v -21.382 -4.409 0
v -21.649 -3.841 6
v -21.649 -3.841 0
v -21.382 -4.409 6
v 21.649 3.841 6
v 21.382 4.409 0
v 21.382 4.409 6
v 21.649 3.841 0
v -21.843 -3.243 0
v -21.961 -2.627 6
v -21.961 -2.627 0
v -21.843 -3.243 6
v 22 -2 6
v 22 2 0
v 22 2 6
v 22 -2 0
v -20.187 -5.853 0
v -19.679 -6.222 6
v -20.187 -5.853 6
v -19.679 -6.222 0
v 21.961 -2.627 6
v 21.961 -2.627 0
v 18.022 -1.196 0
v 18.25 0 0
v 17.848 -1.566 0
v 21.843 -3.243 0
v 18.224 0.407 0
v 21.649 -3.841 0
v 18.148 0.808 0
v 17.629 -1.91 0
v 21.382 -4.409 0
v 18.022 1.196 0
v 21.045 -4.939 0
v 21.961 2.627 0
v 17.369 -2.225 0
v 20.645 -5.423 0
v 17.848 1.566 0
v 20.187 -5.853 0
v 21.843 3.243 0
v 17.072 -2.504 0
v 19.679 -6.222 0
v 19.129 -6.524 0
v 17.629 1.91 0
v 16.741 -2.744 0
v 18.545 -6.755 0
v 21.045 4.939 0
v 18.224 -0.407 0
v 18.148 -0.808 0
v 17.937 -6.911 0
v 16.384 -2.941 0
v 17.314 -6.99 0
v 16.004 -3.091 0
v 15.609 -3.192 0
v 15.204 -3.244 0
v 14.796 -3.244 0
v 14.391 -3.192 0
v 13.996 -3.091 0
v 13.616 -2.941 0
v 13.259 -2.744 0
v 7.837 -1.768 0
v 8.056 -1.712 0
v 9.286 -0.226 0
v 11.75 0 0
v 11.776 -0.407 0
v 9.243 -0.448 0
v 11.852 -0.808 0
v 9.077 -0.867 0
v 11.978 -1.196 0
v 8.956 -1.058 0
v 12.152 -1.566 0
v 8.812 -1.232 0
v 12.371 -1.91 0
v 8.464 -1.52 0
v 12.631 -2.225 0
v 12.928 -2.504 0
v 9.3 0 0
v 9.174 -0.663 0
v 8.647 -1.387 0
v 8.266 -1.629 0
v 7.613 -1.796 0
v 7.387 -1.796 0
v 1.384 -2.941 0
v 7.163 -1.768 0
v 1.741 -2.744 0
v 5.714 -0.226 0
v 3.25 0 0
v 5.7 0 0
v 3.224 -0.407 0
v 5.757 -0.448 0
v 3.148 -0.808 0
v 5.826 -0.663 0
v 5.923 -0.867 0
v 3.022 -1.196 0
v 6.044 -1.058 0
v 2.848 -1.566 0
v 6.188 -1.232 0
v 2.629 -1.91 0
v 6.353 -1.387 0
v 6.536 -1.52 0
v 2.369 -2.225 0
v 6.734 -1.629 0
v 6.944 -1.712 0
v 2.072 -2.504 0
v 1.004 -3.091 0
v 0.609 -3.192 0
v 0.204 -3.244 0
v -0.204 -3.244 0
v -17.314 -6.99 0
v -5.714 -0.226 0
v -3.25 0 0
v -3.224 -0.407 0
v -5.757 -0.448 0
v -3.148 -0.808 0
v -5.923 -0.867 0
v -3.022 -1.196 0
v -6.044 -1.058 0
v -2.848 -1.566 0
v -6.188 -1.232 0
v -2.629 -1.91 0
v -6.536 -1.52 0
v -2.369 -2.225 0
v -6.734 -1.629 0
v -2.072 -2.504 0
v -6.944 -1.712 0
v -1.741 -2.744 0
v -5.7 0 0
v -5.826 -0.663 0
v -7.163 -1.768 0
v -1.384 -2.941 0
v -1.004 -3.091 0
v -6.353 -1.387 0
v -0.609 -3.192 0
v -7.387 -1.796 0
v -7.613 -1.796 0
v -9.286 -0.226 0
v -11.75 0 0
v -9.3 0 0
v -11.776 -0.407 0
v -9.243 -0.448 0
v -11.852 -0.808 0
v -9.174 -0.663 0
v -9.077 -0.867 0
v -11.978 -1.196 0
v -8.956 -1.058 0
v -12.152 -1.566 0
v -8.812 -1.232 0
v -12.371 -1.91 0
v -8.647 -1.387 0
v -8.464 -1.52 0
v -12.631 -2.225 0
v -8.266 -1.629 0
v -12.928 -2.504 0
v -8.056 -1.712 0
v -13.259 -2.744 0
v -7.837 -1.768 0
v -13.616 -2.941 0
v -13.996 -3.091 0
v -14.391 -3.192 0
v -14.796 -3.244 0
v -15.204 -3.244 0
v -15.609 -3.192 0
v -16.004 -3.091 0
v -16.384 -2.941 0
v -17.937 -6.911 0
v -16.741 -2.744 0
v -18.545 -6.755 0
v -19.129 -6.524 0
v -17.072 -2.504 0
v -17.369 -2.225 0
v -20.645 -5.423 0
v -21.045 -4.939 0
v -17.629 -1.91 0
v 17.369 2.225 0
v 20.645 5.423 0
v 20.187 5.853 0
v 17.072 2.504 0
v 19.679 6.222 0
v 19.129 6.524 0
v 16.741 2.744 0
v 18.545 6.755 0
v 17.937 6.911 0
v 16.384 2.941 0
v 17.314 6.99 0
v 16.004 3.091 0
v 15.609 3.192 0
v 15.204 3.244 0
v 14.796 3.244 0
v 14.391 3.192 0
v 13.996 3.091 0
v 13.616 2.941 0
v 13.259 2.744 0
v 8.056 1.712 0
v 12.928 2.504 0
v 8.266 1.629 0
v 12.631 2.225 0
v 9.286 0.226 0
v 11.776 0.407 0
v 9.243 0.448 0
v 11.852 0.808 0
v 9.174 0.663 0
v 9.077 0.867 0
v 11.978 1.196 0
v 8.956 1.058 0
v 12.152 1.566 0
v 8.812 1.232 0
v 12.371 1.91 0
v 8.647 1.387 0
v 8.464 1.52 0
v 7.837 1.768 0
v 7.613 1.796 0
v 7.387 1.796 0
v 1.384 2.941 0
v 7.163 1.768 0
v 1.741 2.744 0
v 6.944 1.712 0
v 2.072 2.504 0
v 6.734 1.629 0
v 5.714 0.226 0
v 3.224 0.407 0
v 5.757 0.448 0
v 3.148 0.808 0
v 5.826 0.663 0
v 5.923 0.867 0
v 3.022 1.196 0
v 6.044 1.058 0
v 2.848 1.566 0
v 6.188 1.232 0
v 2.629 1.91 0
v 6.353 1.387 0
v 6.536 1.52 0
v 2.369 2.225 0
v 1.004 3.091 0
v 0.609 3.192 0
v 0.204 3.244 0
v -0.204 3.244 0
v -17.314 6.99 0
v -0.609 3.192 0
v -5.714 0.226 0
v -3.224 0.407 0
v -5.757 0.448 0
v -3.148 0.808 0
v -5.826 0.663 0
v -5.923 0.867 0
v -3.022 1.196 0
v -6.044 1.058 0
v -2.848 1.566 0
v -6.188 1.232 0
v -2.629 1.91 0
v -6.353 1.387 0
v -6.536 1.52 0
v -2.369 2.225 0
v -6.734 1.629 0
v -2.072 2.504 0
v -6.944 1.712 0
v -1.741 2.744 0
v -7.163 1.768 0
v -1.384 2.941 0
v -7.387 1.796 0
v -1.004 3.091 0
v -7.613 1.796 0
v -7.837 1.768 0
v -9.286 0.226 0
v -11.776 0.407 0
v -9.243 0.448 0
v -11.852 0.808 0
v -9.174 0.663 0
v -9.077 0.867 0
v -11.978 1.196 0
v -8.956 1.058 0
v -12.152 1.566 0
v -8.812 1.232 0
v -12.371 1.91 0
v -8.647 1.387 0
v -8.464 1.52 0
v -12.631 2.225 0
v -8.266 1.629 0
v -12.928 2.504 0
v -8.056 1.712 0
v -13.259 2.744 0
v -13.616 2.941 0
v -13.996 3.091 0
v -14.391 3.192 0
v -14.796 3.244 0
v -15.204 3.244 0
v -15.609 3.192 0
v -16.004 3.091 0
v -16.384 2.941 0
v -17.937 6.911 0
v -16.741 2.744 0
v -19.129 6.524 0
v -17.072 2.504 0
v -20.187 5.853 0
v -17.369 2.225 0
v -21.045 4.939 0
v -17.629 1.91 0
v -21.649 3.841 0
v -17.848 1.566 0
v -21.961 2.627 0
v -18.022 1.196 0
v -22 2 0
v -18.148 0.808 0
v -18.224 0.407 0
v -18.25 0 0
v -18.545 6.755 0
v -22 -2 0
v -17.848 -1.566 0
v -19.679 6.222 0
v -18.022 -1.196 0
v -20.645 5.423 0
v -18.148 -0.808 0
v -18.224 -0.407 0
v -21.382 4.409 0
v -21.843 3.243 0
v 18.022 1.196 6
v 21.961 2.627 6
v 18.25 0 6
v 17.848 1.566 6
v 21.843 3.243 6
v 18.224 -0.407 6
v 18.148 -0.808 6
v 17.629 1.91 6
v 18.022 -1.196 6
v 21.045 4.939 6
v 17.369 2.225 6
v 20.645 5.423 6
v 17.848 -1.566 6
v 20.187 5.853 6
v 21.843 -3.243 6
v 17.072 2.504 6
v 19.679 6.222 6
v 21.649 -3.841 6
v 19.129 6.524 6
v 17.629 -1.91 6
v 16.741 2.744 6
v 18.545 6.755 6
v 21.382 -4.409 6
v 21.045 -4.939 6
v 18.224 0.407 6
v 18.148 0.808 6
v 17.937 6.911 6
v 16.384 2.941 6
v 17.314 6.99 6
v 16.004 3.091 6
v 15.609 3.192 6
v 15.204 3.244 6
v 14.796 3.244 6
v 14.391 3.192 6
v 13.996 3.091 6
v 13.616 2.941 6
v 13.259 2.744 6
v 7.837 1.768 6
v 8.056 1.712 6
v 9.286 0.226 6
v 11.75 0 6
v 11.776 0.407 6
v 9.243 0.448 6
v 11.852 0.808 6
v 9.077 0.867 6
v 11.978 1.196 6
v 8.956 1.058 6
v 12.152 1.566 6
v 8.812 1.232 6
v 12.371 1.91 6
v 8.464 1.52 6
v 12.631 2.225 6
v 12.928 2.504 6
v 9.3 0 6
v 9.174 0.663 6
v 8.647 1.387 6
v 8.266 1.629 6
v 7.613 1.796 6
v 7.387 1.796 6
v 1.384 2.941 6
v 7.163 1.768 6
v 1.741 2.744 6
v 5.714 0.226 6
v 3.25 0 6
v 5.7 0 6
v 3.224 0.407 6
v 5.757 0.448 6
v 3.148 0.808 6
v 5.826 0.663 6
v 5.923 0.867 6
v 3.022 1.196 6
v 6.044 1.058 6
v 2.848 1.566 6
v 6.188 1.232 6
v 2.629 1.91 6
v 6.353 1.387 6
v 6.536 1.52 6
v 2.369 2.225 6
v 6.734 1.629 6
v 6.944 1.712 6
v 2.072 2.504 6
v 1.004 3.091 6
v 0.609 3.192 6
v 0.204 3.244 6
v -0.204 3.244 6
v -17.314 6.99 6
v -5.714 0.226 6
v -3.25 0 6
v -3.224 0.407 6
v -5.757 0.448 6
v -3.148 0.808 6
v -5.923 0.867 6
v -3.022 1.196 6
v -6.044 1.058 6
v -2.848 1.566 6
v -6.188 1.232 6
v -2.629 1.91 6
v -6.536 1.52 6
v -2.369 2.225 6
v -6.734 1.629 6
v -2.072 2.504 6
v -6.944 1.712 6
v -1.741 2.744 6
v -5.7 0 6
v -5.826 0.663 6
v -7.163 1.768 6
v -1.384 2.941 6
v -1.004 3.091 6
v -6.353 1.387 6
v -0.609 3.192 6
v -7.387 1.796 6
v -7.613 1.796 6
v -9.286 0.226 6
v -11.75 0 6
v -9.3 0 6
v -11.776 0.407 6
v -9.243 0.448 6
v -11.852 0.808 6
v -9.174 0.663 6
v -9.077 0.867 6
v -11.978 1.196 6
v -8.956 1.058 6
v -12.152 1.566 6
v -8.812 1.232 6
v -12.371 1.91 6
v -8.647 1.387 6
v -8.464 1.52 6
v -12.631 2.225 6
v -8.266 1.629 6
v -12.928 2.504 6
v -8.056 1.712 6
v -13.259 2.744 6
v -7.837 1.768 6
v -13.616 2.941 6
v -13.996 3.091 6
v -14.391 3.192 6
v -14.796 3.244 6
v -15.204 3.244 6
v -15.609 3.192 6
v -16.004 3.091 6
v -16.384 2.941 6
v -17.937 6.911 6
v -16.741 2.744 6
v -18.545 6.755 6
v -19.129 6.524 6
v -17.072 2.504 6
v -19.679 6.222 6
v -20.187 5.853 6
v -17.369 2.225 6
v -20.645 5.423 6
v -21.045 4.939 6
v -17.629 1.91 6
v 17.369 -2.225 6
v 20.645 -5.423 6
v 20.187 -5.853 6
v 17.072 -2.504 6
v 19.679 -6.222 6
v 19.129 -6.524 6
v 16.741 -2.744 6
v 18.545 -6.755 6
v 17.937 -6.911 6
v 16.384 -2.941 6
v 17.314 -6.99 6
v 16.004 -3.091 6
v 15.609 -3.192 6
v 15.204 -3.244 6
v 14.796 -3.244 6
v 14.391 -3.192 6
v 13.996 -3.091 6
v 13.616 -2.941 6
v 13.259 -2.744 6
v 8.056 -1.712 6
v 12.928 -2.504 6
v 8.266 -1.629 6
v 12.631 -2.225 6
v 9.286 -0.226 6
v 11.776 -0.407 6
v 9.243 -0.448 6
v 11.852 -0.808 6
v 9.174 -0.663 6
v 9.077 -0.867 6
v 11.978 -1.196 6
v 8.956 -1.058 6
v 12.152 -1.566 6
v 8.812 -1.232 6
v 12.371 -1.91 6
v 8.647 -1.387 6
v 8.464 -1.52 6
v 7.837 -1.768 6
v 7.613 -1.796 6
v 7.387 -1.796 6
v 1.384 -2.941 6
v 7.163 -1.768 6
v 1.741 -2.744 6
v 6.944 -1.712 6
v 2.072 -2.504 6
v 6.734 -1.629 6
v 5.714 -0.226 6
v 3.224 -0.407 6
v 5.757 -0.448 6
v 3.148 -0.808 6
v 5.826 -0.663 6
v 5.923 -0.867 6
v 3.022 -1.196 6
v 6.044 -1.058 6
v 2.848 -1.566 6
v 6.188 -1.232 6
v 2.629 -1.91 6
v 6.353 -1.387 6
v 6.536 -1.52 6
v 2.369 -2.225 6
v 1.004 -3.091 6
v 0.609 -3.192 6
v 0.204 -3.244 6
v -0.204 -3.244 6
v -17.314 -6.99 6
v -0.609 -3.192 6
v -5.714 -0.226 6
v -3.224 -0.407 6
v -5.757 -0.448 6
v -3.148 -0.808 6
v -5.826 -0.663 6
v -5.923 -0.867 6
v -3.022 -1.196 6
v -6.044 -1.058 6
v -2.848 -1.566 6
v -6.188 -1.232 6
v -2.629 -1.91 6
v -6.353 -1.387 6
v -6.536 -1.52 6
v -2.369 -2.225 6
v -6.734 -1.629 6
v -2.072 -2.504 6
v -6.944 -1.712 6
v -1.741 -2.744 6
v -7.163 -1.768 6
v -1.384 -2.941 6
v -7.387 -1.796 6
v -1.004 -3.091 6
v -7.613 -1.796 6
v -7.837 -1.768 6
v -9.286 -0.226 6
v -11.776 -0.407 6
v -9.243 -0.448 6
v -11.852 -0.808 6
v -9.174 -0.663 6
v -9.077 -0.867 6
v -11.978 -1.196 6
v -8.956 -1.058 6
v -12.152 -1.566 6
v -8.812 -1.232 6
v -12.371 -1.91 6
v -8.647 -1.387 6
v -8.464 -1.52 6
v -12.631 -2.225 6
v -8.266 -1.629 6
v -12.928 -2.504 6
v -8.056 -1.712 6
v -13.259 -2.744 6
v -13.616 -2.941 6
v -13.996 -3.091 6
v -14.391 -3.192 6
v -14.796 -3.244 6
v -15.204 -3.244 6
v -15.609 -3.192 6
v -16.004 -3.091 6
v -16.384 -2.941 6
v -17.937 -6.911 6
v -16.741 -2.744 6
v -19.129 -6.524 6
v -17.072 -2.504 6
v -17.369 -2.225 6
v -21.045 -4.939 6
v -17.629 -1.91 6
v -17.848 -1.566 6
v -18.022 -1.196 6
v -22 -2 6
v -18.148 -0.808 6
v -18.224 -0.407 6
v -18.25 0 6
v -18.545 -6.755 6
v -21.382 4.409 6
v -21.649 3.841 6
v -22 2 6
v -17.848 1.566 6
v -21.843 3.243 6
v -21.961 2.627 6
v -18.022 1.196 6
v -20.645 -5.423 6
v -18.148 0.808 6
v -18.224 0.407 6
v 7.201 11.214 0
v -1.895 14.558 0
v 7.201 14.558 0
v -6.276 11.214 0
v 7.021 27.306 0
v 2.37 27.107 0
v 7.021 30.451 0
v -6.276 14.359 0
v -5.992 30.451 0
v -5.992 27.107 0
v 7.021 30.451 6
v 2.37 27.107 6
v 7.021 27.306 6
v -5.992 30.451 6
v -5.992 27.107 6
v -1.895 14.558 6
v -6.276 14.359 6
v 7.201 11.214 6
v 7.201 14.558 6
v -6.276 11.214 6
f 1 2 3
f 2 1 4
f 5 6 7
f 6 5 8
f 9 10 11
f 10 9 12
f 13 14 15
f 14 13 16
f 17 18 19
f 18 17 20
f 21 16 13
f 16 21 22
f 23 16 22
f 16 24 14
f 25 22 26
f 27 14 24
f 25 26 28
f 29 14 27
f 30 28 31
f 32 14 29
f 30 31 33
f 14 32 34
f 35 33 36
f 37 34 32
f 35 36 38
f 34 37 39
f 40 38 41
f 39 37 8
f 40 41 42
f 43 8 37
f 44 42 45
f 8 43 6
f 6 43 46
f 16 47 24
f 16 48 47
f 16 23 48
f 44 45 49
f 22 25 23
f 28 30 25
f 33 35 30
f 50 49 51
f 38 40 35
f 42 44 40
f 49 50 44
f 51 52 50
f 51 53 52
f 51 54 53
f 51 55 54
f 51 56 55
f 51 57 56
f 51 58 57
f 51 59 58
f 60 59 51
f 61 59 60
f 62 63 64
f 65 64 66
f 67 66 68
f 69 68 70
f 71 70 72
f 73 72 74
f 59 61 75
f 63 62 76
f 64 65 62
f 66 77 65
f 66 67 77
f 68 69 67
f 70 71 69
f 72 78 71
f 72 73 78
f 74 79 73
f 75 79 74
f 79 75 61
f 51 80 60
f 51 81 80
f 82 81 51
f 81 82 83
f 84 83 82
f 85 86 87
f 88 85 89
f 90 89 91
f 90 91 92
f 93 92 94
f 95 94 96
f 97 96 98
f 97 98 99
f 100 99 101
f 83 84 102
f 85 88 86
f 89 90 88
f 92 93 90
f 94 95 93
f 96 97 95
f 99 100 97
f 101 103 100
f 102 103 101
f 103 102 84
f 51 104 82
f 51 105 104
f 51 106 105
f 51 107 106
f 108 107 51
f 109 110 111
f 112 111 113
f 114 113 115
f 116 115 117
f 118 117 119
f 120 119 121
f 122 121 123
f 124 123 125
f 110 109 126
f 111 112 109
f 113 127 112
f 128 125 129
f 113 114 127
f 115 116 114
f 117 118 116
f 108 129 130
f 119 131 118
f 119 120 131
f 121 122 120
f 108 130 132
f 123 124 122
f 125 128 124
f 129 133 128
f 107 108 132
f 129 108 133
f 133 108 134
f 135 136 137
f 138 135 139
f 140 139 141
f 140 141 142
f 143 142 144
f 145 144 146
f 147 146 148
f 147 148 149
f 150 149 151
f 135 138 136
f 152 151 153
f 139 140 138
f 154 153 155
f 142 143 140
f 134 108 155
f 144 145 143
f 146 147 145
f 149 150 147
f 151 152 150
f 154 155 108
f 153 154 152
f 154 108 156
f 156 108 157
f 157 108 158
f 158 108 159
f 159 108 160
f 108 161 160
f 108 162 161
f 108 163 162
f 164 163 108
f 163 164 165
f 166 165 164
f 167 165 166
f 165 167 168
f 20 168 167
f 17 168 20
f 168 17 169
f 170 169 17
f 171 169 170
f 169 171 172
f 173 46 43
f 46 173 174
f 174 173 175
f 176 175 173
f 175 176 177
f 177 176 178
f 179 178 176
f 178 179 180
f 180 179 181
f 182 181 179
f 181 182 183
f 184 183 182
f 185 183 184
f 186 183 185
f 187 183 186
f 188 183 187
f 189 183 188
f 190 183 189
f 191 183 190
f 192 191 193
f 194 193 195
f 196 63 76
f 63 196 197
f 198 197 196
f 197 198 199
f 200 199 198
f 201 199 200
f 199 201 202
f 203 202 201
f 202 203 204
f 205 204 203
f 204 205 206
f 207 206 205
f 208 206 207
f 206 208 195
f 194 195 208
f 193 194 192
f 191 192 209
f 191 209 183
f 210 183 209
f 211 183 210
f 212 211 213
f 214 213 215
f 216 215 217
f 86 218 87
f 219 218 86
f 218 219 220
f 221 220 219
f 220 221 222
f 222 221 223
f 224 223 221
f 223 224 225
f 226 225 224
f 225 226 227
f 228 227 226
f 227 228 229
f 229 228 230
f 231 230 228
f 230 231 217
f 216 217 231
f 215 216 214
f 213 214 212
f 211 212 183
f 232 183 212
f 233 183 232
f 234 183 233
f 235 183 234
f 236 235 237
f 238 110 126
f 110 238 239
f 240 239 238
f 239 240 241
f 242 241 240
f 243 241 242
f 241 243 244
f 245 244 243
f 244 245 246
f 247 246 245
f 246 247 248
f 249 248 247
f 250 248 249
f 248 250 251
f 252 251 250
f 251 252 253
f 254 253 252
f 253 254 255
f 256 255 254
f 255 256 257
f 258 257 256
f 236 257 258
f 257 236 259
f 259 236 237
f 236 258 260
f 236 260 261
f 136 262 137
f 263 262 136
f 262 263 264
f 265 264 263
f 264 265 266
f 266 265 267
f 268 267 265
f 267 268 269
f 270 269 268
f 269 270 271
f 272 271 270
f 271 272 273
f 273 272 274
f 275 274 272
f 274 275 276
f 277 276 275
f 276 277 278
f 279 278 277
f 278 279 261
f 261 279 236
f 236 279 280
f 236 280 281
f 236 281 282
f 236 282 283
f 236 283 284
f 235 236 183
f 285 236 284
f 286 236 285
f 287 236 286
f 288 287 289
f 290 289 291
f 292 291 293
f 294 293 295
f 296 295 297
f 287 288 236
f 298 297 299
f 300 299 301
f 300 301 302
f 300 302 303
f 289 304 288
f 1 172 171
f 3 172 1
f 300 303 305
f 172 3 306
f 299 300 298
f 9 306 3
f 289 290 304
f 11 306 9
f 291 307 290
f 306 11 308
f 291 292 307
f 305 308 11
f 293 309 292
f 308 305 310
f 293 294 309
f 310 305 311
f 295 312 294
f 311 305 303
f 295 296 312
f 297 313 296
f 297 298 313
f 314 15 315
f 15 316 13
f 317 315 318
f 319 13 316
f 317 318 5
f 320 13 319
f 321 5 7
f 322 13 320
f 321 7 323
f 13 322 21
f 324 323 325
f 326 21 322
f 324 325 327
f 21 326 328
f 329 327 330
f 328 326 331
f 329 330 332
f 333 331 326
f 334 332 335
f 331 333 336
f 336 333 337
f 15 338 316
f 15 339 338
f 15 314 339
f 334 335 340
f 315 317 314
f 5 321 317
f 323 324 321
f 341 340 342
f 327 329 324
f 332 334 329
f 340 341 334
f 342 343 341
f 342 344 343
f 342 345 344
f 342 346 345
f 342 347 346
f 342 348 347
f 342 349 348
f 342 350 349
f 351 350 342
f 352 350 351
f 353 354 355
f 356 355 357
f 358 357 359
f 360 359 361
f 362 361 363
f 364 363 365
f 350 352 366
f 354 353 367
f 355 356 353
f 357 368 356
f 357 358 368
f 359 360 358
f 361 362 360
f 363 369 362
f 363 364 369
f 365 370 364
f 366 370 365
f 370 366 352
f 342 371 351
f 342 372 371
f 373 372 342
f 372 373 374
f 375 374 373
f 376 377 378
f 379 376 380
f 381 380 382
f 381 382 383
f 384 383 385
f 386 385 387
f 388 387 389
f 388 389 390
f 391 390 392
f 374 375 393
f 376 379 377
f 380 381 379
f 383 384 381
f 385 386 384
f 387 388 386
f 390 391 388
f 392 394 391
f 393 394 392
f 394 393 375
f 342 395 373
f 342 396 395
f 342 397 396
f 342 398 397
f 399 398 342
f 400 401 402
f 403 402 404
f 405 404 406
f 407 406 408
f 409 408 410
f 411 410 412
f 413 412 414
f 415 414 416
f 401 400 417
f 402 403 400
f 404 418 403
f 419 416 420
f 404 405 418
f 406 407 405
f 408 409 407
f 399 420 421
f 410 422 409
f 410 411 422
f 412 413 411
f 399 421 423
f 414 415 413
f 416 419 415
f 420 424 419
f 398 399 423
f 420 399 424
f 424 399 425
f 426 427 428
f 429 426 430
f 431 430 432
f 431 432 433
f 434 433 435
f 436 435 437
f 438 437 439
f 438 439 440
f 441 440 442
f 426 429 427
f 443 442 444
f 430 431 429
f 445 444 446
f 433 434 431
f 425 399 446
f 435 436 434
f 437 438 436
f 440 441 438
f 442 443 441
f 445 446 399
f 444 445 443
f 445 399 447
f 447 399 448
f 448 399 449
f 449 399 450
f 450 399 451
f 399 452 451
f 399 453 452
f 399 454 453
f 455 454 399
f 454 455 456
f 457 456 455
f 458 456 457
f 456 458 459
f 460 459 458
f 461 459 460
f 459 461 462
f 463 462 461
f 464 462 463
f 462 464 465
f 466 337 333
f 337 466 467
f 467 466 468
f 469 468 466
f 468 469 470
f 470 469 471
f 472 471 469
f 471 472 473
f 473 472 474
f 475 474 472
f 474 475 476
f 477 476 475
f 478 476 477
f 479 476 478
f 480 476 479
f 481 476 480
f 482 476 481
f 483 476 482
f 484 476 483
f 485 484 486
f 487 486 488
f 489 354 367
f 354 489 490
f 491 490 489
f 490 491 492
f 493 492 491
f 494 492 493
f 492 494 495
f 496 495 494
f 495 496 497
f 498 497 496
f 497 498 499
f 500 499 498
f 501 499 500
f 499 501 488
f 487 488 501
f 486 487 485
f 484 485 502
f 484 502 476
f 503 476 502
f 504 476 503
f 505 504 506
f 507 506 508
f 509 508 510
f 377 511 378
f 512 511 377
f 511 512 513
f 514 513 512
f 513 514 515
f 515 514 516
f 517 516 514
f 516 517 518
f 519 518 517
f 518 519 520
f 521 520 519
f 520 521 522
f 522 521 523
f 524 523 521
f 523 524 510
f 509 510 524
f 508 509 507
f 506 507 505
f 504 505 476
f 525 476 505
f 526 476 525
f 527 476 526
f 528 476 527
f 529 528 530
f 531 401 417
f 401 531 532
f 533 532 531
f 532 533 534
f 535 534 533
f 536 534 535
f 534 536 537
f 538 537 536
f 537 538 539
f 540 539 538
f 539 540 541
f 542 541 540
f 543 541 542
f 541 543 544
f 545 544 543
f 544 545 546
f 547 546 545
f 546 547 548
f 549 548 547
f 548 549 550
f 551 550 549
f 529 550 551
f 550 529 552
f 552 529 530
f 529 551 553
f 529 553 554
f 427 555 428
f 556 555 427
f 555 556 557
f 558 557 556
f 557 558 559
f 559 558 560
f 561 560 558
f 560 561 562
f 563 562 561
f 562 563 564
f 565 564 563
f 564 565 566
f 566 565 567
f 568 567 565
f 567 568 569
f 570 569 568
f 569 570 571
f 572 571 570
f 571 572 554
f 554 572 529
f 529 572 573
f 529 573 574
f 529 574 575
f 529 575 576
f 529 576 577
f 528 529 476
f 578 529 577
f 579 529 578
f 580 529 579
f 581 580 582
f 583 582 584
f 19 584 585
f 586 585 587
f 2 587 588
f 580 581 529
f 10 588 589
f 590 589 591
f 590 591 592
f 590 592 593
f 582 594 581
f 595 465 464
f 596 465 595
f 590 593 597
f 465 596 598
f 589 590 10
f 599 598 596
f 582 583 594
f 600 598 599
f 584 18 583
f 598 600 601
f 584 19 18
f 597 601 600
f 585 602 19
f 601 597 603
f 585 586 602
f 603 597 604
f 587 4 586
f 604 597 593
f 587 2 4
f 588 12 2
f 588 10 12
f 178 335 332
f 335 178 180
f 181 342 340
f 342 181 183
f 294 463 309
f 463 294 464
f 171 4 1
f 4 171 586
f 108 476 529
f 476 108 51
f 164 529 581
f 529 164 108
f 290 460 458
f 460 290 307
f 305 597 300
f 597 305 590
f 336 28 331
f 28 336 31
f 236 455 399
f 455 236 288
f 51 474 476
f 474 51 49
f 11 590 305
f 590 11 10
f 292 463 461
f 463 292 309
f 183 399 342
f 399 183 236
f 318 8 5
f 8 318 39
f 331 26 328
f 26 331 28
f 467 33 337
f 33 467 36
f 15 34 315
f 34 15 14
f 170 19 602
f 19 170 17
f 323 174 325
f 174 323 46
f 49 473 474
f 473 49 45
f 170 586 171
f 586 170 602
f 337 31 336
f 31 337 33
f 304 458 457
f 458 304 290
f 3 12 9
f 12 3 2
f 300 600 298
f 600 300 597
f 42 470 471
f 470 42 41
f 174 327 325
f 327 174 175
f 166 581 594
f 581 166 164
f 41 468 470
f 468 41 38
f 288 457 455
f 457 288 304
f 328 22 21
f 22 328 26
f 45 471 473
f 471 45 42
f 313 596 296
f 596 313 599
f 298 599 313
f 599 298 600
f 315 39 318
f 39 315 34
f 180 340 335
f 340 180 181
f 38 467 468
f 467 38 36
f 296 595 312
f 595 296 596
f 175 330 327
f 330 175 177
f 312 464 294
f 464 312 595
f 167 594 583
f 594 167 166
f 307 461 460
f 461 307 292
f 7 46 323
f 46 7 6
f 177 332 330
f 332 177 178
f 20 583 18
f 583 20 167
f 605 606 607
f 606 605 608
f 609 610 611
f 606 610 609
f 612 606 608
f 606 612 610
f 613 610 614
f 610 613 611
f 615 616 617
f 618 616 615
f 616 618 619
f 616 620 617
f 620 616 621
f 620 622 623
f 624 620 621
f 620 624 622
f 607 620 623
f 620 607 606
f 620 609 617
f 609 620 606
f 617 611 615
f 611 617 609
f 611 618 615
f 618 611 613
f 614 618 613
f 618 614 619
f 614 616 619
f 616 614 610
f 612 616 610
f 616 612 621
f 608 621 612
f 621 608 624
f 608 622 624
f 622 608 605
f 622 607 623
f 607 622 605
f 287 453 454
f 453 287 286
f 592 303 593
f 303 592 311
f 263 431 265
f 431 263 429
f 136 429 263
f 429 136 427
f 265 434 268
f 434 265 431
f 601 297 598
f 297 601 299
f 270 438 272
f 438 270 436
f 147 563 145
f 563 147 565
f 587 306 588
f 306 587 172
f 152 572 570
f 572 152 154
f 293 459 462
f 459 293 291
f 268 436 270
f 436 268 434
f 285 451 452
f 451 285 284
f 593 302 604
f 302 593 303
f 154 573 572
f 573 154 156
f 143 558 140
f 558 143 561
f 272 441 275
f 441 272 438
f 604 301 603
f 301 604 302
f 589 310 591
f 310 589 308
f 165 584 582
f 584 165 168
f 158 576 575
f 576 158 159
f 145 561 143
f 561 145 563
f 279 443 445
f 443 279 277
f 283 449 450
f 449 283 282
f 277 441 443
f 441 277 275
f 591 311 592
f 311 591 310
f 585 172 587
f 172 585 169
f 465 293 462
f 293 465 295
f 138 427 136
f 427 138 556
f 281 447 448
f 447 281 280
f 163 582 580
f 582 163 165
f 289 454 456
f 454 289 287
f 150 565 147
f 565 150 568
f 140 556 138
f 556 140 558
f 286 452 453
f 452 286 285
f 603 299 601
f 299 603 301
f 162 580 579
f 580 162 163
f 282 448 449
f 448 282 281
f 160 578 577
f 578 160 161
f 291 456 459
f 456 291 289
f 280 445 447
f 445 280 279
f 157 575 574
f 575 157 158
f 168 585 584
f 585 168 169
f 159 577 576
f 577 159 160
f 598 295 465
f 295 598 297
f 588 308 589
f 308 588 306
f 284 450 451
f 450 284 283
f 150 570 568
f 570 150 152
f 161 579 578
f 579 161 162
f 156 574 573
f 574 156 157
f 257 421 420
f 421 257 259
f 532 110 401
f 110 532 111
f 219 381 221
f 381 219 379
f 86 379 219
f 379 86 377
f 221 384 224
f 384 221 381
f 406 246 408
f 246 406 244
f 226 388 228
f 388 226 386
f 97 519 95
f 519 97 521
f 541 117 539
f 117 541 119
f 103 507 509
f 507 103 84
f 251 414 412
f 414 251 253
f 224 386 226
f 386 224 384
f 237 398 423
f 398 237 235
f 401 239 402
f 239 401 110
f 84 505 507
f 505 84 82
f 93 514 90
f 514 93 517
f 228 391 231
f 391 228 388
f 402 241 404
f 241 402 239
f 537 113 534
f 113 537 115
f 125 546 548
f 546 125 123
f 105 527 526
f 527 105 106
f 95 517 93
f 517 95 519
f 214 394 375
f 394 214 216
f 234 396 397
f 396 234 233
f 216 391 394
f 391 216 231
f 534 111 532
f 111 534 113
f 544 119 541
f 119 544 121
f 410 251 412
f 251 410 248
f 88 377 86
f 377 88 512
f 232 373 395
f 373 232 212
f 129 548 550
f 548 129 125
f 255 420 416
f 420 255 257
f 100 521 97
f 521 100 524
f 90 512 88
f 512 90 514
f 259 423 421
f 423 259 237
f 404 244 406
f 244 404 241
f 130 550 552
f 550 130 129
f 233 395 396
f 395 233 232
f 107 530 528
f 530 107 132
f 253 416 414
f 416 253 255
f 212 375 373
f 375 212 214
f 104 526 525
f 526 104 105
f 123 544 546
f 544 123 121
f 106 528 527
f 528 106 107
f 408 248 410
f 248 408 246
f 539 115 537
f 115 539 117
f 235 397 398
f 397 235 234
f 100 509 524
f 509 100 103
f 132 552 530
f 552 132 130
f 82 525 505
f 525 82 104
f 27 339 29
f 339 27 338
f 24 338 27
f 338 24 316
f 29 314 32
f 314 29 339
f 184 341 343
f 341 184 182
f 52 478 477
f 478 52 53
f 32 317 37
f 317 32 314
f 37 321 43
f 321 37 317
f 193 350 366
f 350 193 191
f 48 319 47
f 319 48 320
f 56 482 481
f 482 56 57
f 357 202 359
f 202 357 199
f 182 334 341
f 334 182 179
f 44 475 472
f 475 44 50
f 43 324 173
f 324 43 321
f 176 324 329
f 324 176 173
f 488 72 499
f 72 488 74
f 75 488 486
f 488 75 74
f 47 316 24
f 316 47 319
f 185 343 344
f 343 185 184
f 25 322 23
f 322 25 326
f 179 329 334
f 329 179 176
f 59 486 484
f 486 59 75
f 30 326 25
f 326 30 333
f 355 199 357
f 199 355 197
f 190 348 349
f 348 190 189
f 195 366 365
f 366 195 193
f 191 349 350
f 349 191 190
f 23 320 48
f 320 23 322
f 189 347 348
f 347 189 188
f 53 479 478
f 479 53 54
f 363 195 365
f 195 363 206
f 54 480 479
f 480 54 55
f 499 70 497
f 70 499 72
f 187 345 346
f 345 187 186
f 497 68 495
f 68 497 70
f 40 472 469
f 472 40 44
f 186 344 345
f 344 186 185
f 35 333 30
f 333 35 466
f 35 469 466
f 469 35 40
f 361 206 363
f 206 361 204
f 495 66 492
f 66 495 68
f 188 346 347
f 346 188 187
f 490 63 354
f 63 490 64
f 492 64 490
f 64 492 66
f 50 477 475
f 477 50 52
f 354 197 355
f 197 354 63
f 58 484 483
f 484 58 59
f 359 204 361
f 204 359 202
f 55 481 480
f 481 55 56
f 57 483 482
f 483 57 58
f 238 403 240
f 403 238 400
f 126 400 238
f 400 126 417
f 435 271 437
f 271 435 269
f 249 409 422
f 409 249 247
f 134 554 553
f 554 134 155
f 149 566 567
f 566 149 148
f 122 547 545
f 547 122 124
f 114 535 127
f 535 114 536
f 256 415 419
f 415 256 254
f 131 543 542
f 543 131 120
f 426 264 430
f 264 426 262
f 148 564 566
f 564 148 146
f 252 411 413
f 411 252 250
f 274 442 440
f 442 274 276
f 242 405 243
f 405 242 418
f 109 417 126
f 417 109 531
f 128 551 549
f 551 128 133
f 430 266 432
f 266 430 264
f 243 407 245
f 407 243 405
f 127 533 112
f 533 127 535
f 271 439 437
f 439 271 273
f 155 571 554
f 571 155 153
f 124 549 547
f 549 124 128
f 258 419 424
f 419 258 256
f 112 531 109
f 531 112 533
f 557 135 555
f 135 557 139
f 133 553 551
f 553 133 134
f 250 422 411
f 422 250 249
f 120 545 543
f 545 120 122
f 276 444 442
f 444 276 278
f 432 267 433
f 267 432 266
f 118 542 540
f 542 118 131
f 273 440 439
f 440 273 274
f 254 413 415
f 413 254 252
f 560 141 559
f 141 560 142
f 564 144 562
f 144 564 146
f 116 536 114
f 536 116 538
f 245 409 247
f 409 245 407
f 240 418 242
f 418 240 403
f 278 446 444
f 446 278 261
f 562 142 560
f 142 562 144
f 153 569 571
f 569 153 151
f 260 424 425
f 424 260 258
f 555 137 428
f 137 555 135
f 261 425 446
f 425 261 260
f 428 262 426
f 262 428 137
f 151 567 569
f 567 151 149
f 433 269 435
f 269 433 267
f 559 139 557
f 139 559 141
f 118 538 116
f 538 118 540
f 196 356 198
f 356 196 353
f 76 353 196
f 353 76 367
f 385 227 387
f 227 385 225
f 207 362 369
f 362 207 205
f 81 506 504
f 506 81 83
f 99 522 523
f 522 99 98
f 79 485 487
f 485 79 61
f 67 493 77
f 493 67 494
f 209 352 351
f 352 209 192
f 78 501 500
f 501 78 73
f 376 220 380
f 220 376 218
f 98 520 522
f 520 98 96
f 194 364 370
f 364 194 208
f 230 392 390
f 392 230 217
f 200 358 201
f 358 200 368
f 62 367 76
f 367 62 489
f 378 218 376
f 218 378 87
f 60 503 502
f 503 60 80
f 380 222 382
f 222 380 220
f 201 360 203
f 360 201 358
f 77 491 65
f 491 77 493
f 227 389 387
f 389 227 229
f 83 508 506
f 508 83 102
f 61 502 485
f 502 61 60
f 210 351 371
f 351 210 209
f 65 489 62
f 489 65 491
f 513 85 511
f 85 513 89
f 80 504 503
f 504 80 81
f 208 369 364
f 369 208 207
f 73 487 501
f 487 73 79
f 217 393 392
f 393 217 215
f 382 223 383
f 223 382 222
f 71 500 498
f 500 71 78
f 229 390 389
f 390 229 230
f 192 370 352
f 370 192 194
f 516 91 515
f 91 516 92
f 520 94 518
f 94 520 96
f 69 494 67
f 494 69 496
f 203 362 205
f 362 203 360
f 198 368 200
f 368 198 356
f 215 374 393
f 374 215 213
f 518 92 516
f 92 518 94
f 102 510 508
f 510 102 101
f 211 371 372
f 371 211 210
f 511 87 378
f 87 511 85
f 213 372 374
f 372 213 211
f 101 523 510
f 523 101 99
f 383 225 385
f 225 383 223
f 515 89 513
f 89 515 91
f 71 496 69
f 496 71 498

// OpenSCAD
$fn = 50;


difference() {
	union() {
		hull() {
			translate(v = [-17.0000000000, 2.0000000000, 0]) {
				cylinder(h = 6, r = 5);
			}
			translate(v = [17.0000000000, 2.0000000000, 0]) {
				cylinder(h = 6, r = 5);
			}
			translate(v = [-17.0000000000, -2.0000000000, 0]) {
				cylinder(h = 6, r = 5);
			}
			translate(v = [17.0000000000, -2.0000000000, 0]) {
				cylinder(h = 6, r = 5);
			}
		}
		translate(v = [0, 30.0000000000, 0]) {
			linear_extrude(height = 6) {
				text(font = "DejaVu Sans Mono:style=Bold", halign = "center", size = 19.0000000000, text = "Z", valign = "top");
			}
		}
	}
	union() {
		translate(v = [-15.0000000000, 0.0000000000, 0]) {
			translate(v = [0, 0, -100]) {
				cylinder(h = 200, r = 3.2500000000);
			}
		}
		translate(v = [0, 0, -100]) {
			cylinder(h = 200, r = 3.2500000000);
		}
		translate(v = [15.0000000000, 0.0000000000, 0]) {
			translate(v = [0, 0, -100]) {
				cylinder(h = 200, r = 3.2500000000);
			}
		}
		translate(v = [-15.0000000000, 0.0000000000, 0]) {
			translate(v = [0, 0, -100]) {
				cylinder(h = 200, r = 1.8000000000);
			}
		}
		translate(v = [-7.5000000000, 0.0000000000, 0]) {
			translate(v = [0, 0, -100]) {
				cylinder(h = 200, r = 1.8000000000);
			}
		}
		translate(v = [0, 0, -100]) {
			cylinder(h = 200, r = 1.8000000000);
		}
		translate(v = [7.5000000000, 0.0000000000, 0]) {
			translate(v = [0, 0, -100]) {
				cylinder(h = 200, r = 1.8000000000);
			}
		}
		translate(v = [15.0000000000, 0.0000000000, 0]) {
			translate(v = [0, 0, -100]) {
				cylinder(h = 200, r = 1.8000000000);
			}
		}
	}
}
